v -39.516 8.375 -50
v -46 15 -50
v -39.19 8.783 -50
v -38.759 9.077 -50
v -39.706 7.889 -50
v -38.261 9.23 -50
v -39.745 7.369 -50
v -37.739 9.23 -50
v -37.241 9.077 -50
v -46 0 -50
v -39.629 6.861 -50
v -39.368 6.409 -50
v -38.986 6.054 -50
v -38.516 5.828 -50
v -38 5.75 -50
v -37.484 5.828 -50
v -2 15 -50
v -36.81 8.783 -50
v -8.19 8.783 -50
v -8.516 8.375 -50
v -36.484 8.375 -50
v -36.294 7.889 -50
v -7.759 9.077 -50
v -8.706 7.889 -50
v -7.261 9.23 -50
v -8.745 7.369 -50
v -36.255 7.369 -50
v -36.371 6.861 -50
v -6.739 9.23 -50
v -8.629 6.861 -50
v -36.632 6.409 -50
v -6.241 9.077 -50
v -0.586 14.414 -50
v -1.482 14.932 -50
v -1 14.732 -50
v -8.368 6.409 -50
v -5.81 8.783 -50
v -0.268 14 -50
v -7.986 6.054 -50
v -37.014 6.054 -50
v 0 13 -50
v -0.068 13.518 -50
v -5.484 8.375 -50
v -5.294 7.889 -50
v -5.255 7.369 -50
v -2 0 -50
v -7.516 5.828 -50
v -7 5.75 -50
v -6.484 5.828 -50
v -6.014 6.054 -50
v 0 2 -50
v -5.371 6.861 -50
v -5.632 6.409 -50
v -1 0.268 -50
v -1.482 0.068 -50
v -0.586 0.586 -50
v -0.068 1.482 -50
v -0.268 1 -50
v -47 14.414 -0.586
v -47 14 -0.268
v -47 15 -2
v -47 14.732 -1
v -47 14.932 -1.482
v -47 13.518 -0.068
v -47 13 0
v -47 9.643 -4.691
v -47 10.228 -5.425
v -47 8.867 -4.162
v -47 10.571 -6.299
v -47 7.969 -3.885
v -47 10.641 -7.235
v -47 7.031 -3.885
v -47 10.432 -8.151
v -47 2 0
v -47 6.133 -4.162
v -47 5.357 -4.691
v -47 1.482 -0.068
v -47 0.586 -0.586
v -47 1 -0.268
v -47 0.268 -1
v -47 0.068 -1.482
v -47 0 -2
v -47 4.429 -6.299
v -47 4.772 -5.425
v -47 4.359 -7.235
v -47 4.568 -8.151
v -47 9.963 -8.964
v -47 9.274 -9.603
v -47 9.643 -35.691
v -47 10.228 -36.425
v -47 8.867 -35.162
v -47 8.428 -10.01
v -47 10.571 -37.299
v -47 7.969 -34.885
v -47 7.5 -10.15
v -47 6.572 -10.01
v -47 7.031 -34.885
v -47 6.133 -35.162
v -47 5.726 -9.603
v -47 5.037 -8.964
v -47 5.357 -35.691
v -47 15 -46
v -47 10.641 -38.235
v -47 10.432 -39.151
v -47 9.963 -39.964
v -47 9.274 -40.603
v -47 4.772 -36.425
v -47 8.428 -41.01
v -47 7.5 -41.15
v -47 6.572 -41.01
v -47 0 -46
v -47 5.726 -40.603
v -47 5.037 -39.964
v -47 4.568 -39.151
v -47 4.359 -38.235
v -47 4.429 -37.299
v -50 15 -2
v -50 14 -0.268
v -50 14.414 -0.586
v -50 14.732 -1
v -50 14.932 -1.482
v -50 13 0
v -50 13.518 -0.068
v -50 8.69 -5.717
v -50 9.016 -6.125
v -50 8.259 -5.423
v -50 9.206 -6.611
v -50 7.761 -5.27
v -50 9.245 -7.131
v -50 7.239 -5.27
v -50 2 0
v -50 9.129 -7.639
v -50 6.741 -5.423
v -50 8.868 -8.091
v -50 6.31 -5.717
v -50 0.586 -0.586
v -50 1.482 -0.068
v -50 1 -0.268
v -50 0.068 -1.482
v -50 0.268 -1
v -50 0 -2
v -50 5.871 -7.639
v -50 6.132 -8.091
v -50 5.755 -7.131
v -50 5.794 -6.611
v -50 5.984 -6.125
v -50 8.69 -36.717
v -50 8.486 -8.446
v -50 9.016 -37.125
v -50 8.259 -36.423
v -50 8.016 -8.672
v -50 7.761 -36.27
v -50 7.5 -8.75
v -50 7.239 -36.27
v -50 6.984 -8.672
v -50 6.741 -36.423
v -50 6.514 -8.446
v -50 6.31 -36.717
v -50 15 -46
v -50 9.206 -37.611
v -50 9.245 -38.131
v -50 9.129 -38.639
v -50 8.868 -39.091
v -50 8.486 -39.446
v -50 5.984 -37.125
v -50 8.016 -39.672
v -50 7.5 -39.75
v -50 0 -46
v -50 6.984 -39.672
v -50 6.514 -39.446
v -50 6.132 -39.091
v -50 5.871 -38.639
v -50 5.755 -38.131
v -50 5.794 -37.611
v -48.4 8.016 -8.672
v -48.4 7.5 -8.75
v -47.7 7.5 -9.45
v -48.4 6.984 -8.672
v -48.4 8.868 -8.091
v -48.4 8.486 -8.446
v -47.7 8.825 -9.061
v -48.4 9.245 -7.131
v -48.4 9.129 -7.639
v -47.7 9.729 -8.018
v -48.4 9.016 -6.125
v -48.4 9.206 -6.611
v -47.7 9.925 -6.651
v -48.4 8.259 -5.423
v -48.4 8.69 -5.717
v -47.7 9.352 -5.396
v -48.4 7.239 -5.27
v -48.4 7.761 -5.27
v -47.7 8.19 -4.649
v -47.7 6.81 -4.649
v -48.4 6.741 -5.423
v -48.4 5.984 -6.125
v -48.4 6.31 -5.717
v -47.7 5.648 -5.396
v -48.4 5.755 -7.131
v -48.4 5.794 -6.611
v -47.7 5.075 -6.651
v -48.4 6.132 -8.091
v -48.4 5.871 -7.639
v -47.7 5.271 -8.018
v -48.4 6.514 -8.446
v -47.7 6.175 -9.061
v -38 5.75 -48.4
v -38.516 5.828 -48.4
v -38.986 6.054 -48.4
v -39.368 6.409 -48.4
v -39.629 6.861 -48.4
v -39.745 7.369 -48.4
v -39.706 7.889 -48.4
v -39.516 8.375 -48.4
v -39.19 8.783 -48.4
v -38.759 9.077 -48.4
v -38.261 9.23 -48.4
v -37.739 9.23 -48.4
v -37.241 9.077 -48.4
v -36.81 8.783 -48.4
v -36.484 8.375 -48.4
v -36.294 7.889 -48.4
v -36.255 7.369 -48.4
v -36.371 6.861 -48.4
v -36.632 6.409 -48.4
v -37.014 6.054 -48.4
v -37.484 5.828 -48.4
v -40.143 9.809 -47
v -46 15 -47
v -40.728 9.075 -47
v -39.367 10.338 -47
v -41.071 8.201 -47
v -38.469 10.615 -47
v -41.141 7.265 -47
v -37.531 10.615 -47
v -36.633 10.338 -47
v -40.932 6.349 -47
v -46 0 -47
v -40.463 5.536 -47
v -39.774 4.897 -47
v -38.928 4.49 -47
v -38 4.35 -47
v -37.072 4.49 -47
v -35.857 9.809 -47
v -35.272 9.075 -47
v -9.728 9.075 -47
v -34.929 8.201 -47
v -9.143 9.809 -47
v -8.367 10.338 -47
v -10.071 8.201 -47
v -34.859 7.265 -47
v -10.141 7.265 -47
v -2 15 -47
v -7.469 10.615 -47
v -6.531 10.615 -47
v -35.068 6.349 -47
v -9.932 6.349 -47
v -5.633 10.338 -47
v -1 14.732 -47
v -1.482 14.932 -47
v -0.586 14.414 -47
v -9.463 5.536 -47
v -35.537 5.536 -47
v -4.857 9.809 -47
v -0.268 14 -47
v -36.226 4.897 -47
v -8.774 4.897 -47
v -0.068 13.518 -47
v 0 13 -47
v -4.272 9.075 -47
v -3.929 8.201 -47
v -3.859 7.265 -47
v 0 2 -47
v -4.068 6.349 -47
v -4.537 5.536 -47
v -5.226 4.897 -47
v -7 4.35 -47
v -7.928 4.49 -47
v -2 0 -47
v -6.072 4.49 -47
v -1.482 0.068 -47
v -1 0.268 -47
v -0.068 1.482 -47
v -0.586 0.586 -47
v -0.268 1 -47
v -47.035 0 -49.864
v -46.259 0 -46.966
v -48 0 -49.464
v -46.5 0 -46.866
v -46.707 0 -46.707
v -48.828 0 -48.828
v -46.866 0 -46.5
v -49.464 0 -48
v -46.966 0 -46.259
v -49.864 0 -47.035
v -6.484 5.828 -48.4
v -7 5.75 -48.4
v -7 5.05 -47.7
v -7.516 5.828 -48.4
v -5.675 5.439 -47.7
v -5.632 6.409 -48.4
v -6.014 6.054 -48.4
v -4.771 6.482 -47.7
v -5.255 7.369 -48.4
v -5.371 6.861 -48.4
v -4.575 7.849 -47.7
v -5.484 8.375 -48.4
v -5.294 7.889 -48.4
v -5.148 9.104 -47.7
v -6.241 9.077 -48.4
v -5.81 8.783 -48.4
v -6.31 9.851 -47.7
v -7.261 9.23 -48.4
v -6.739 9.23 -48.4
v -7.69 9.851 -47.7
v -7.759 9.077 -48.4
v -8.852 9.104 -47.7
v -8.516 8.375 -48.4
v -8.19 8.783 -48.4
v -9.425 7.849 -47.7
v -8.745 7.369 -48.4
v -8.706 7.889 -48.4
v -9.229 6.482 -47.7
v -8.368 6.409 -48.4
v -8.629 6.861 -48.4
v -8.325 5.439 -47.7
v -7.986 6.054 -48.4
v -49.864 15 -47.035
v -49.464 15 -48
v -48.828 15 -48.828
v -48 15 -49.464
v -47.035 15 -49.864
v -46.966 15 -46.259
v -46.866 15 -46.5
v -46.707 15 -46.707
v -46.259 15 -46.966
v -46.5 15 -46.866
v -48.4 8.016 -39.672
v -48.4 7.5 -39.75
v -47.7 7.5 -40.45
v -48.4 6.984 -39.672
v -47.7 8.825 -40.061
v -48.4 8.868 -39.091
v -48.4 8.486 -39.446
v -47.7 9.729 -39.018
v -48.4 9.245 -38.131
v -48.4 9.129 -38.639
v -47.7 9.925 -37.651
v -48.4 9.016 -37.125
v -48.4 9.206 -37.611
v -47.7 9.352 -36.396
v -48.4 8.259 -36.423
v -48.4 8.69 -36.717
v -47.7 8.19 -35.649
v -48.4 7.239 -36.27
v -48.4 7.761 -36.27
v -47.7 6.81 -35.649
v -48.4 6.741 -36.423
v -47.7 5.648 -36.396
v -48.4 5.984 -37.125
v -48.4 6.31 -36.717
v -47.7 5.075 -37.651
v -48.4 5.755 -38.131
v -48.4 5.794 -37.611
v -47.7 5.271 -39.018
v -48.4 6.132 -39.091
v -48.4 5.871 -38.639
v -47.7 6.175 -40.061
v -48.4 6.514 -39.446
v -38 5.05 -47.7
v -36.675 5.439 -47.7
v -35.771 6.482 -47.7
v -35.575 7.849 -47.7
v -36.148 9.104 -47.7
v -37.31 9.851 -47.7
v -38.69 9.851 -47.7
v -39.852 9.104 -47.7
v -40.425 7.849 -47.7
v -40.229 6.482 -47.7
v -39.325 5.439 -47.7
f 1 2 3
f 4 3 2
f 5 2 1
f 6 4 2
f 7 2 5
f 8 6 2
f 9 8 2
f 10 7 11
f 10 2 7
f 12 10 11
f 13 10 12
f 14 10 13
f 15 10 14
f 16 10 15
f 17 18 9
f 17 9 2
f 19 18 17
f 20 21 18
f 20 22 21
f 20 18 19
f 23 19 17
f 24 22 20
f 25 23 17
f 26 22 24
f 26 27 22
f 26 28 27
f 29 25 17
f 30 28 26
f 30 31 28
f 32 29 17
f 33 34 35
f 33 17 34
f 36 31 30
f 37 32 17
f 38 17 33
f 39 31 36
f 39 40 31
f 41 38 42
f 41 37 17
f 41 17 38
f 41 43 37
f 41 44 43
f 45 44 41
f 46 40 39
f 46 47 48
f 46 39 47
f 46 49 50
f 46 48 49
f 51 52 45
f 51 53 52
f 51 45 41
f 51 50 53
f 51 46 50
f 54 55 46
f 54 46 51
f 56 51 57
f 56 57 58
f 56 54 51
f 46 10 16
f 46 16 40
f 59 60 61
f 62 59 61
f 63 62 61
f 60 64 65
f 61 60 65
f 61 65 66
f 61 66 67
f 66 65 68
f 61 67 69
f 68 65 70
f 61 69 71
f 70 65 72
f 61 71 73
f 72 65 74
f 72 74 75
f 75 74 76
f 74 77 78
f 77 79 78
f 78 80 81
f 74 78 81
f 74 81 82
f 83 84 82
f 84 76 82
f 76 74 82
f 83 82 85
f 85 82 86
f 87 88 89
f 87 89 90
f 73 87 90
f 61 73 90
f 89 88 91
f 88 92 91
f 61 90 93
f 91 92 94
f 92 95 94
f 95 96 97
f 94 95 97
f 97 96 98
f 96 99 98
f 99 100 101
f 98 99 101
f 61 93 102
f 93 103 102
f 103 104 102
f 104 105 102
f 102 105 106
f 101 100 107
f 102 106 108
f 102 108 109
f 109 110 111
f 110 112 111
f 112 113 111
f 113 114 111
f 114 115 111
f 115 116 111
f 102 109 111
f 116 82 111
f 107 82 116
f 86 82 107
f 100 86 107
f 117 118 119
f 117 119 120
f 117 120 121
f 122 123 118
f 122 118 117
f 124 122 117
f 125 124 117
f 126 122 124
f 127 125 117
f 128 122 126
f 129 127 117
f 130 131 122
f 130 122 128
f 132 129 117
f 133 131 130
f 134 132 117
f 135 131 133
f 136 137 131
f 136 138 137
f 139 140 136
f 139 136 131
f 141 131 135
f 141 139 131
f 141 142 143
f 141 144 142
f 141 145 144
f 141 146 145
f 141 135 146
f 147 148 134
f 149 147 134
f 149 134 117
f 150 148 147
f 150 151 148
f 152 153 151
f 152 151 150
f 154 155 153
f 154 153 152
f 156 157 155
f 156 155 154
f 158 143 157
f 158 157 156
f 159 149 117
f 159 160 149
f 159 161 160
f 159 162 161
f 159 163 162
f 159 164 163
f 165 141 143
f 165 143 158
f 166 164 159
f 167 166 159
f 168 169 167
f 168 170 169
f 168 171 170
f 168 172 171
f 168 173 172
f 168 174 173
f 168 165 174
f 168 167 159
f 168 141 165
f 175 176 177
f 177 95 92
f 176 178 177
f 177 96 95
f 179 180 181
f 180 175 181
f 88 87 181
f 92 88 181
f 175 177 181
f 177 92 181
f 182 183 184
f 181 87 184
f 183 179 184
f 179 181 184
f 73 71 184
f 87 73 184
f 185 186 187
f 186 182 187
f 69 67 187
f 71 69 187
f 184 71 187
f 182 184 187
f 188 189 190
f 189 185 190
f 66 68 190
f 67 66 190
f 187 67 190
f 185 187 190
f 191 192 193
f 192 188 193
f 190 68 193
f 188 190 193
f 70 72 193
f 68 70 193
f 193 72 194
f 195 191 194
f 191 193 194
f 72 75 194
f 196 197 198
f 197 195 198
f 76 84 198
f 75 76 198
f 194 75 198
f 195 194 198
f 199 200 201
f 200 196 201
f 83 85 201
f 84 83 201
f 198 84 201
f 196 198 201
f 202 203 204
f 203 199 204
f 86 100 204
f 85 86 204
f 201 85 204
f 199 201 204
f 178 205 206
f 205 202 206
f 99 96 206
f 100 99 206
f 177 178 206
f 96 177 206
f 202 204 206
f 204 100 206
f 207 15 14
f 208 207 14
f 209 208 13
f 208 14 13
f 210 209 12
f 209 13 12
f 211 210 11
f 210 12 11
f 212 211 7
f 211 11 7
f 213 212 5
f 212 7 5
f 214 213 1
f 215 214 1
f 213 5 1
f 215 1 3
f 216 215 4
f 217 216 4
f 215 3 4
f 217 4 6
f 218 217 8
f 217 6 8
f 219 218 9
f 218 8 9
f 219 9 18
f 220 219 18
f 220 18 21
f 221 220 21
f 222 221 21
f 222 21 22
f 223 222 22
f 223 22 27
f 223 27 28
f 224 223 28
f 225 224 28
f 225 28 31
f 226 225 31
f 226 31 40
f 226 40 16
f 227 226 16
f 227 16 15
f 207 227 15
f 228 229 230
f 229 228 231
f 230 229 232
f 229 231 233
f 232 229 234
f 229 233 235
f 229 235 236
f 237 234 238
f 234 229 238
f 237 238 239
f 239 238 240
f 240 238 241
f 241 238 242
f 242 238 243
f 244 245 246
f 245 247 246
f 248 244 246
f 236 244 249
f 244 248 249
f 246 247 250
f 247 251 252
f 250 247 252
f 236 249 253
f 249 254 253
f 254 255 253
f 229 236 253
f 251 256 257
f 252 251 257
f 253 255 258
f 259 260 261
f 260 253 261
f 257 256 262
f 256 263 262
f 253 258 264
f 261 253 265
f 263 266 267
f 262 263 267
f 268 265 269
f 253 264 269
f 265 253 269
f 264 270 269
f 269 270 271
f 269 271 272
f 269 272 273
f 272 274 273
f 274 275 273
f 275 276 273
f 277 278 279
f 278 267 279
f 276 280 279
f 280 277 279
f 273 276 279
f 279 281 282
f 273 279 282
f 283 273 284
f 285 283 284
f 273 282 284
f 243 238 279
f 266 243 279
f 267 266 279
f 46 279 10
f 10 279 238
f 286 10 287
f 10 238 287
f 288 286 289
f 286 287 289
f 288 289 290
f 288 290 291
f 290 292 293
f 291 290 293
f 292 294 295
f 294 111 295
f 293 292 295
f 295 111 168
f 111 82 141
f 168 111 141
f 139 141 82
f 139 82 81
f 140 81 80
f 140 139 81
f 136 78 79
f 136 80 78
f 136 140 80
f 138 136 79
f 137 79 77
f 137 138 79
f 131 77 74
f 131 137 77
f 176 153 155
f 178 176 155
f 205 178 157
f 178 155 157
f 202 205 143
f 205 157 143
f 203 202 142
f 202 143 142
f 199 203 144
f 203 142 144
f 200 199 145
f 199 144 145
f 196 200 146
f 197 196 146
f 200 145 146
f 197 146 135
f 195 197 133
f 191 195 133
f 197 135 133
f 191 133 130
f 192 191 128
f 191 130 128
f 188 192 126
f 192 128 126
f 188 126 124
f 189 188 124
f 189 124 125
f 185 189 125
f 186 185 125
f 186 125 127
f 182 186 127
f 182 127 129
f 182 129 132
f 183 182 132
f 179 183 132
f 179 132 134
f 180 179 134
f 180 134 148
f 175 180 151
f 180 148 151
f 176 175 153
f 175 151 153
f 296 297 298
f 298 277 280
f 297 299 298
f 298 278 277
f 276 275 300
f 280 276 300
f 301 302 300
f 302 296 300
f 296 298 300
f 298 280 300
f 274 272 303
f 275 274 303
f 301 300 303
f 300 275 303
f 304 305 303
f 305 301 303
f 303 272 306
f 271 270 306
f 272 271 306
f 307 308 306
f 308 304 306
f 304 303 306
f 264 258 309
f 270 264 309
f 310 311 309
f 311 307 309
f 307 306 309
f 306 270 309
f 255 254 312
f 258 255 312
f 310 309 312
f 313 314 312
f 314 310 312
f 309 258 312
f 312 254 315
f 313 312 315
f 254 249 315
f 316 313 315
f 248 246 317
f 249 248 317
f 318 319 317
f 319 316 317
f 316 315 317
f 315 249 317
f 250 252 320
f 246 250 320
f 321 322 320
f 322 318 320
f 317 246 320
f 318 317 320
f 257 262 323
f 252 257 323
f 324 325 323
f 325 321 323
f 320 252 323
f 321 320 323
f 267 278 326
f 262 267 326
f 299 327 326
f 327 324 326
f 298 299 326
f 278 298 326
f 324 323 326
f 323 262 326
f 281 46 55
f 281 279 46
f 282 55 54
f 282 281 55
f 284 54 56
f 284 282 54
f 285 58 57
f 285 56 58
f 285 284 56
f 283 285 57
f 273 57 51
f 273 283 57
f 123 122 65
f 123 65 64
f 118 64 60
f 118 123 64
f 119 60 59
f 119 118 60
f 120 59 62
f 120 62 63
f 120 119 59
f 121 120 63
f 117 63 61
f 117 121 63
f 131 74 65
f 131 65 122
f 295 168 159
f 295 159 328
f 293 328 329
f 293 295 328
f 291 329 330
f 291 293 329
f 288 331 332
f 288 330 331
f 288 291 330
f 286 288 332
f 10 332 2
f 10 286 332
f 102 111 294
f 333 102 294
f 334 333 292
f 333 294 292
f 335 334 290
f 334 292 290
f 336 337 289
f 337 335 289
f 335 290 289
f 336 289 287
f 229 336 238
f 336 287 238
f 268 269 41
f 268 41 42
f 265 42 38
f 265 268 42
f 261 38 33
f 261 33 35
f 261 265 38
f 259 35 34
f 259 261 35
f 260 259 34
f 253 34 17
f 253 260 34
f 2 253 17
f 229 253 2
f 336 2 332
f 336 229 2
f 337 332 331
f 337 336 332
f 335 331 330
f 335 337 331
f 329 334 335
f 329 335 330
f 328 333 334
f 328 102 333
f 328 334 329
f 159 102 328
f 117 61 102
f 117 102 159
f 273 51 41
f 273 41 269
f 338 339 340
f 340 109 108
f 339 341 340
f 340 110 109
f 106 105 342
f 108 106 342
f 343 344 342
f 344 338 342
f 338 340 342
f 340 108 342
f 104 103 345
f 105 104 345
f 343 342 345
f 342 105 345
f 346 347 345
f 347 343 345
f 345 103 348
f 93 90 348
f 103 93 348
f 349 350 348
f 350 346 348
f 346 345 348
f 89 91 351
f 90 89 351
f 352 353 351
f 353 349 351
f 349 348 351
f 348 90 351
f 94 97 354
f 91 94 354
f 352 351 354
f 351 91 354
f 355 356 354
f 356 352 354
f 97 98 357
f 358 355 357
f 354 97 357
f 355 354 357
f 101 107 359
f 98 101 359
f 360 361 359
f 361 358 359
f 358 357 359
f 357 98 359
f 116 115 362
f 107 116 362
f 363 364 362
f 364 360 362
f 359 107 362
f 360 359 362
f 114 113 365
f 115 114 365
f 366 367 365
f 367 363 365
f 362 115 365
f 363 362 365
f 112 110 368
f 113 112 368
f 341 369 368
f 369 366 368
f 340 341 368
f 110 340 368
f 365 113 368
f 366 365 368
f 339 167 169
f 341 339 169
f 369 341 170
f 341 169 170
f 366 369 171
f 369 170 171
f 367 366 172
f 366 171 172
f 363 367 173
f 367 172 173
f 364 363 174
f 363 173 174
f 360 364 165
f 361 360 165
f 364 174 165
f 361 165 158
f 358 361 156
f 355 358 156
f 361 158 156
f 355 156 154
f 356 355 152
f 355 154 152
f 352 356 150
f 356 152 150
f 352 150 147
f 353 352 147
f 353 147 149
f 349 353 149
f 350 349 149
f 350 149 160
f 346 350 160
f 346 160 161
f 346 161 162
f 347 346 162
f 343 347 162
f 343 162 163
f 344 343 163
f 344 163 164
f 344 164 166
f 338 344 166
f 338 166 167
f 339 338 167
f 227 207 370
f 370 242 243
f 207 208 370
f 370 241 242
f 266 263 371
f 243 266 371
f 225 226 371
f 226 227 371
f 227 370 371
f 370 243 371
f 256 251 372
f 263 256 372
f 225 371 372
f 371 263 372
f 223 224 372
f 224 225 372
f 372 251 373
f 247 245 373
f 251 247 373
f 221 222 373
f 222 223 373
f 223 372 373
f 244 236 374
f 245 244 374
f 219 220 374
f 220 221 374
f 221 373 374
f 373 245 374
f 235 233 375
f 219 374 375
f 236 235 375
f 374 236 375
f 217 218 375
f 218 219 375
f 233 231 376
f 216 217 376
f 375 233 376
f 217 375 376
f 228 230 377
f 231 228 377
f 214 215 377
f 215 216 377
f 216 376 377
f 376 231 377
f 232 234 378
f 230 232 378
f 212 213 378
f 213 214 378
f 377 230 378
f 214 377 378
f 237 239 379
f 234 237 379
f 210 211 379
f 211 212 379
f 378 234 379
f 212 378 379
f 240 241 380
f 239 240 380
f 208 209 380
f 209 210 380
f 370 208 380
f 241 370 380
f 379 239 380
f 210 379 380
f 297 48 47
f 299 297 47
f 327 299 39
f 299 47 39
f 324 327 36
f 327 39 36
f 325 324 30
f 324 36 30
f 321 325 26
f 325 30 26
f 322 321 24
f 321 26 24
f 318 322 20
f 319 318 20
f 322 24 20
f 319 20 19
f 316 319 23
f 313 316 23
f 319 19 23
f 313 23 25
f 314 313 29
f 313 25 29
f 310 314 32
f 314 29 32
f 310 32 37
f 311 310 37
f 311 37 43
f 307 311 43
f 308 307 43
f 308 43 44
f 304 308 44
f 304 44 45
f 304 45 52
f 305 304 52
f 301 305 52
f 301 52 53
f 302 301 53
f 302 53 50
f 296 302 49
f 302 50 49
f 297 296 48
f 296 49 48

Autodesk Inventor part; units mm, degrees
ref_plane "YZ Plane" through (0, 0, 0) normal (1, 0, 0) x (0, 1, 0)
ref_plane "XZ Plane" through (0, 0, 0) normal (0, 1, 0) x (-1, 0, 0)
ref_plane "XY Plane" through (0, 0, 0) normal (0, 0, 1) x (1, 0, 0)
sketch "Sketch1" plane through (0, 0, 0) normal (0, 1, 0) x (-1, 0, 0)
  line L0 (0, 0) -> (50, 0)
  line L1 (50, 0) -> (50, -46)
  line L2 (46, -50) -> (0, -50)
  line L3 (0, -50) -> (0, 0)
  arc A0 (46, -50) -> (50, -46) centre (46, -46) ccw
  line L4 (0, 0) -> (47, 0)
  line L5 (47, 0) -> (47, -46)
  line L6 (46, -47) -> (0, -47)
  line L7 (0, -47) -> (0, 0)
  arc A1 (46, -47) -> (47, -46) centre (46, -46) ccw
  point P0 (50, -50)
  point P1 (47, -47)
  dimension "d0" = 50
  dimension "d1" = 50
  dimension "d2" = 4
  dimension "d3" = 47
  dimension "d4" = 47
  dimension "d5" = 1
extrude "Extrusion1" add sketch "Sketch1" along normal blind 15 contours L0 L1 A0 L2 L3 L6 A1 L5
fillet "Fillet1" radius 2 4 edges at (-48.5, 15, 0) (-48.5, 0, 0) (0, 15, -48.5) (0, 0, -48.5)
sketch "Sketch2" plane through (-47, 0, -46) normal (1, 0, 0) x (0, 0, -1)
  line L0 (-57.4618, 7.5) -> (28.1267, 7.5) construction
  line L1 (-46, 2) -> (-46, 13) projected
  point P0 (-46, 0)
  point P1 (-46, 7.5)
  point P2 (-39, 7.5)
  point P3 (-8, 7.5)
  dimension "d9" = 7
  dimension "d10" = 31
hole "Hole1" at (-47, 7.5, -7) at (-47, 7.5, -38) direction (-1, 0, 0) diameter 3.5 end through all countersink diameter 6.3 countersink angle 90 clearance for "Countersunk Flat Head Screw ISO 2009/7046" size "M3" standard "ISO"
sketch "Sketch3" plane through (-46, 0, -47) normal (0, 0, 1) x (1, 0, 0)
  line L0 (63.5676, 7.5) -> (-29.6264, 7.5) construction
  line L1 (46, 2) -> (46, 13) construction
  arc A0 (44, 0) -> (46, 2) centre (44, 2) ccw projected
  line L2 (46, 2) -> (46, 13) projected
  arc A1 (46, 13) -> (44, 15) centre (44, 13) ccw projected
  line L3 (0, 15) -> (44, 15) projected
  line L4 (0, 0) -> (0, 15) projected
  line L5 (0, 0) -> (44, 0) projected
  point P0 (46, 0)
  point P1 (46, 7.5)
  point P2 (39, 7.5)
  point P3 (8, 7.5)
  dimension "d18" = 7
  dimension "d19" = 31
hole "Hole2" at (-7, 7.5, -47) at (-38, 7.5, -47) direction (0, 0, -1) diameter 3.5 end through all countersink diameter 6.3 countersink angle 90 clearance for "Countersunk Flat Head Screw ISO 2009/7046" size "M3" standard "ISO"
properties part number "Right Bracket 50mm RS749-1680" material "Stainless Steel"
